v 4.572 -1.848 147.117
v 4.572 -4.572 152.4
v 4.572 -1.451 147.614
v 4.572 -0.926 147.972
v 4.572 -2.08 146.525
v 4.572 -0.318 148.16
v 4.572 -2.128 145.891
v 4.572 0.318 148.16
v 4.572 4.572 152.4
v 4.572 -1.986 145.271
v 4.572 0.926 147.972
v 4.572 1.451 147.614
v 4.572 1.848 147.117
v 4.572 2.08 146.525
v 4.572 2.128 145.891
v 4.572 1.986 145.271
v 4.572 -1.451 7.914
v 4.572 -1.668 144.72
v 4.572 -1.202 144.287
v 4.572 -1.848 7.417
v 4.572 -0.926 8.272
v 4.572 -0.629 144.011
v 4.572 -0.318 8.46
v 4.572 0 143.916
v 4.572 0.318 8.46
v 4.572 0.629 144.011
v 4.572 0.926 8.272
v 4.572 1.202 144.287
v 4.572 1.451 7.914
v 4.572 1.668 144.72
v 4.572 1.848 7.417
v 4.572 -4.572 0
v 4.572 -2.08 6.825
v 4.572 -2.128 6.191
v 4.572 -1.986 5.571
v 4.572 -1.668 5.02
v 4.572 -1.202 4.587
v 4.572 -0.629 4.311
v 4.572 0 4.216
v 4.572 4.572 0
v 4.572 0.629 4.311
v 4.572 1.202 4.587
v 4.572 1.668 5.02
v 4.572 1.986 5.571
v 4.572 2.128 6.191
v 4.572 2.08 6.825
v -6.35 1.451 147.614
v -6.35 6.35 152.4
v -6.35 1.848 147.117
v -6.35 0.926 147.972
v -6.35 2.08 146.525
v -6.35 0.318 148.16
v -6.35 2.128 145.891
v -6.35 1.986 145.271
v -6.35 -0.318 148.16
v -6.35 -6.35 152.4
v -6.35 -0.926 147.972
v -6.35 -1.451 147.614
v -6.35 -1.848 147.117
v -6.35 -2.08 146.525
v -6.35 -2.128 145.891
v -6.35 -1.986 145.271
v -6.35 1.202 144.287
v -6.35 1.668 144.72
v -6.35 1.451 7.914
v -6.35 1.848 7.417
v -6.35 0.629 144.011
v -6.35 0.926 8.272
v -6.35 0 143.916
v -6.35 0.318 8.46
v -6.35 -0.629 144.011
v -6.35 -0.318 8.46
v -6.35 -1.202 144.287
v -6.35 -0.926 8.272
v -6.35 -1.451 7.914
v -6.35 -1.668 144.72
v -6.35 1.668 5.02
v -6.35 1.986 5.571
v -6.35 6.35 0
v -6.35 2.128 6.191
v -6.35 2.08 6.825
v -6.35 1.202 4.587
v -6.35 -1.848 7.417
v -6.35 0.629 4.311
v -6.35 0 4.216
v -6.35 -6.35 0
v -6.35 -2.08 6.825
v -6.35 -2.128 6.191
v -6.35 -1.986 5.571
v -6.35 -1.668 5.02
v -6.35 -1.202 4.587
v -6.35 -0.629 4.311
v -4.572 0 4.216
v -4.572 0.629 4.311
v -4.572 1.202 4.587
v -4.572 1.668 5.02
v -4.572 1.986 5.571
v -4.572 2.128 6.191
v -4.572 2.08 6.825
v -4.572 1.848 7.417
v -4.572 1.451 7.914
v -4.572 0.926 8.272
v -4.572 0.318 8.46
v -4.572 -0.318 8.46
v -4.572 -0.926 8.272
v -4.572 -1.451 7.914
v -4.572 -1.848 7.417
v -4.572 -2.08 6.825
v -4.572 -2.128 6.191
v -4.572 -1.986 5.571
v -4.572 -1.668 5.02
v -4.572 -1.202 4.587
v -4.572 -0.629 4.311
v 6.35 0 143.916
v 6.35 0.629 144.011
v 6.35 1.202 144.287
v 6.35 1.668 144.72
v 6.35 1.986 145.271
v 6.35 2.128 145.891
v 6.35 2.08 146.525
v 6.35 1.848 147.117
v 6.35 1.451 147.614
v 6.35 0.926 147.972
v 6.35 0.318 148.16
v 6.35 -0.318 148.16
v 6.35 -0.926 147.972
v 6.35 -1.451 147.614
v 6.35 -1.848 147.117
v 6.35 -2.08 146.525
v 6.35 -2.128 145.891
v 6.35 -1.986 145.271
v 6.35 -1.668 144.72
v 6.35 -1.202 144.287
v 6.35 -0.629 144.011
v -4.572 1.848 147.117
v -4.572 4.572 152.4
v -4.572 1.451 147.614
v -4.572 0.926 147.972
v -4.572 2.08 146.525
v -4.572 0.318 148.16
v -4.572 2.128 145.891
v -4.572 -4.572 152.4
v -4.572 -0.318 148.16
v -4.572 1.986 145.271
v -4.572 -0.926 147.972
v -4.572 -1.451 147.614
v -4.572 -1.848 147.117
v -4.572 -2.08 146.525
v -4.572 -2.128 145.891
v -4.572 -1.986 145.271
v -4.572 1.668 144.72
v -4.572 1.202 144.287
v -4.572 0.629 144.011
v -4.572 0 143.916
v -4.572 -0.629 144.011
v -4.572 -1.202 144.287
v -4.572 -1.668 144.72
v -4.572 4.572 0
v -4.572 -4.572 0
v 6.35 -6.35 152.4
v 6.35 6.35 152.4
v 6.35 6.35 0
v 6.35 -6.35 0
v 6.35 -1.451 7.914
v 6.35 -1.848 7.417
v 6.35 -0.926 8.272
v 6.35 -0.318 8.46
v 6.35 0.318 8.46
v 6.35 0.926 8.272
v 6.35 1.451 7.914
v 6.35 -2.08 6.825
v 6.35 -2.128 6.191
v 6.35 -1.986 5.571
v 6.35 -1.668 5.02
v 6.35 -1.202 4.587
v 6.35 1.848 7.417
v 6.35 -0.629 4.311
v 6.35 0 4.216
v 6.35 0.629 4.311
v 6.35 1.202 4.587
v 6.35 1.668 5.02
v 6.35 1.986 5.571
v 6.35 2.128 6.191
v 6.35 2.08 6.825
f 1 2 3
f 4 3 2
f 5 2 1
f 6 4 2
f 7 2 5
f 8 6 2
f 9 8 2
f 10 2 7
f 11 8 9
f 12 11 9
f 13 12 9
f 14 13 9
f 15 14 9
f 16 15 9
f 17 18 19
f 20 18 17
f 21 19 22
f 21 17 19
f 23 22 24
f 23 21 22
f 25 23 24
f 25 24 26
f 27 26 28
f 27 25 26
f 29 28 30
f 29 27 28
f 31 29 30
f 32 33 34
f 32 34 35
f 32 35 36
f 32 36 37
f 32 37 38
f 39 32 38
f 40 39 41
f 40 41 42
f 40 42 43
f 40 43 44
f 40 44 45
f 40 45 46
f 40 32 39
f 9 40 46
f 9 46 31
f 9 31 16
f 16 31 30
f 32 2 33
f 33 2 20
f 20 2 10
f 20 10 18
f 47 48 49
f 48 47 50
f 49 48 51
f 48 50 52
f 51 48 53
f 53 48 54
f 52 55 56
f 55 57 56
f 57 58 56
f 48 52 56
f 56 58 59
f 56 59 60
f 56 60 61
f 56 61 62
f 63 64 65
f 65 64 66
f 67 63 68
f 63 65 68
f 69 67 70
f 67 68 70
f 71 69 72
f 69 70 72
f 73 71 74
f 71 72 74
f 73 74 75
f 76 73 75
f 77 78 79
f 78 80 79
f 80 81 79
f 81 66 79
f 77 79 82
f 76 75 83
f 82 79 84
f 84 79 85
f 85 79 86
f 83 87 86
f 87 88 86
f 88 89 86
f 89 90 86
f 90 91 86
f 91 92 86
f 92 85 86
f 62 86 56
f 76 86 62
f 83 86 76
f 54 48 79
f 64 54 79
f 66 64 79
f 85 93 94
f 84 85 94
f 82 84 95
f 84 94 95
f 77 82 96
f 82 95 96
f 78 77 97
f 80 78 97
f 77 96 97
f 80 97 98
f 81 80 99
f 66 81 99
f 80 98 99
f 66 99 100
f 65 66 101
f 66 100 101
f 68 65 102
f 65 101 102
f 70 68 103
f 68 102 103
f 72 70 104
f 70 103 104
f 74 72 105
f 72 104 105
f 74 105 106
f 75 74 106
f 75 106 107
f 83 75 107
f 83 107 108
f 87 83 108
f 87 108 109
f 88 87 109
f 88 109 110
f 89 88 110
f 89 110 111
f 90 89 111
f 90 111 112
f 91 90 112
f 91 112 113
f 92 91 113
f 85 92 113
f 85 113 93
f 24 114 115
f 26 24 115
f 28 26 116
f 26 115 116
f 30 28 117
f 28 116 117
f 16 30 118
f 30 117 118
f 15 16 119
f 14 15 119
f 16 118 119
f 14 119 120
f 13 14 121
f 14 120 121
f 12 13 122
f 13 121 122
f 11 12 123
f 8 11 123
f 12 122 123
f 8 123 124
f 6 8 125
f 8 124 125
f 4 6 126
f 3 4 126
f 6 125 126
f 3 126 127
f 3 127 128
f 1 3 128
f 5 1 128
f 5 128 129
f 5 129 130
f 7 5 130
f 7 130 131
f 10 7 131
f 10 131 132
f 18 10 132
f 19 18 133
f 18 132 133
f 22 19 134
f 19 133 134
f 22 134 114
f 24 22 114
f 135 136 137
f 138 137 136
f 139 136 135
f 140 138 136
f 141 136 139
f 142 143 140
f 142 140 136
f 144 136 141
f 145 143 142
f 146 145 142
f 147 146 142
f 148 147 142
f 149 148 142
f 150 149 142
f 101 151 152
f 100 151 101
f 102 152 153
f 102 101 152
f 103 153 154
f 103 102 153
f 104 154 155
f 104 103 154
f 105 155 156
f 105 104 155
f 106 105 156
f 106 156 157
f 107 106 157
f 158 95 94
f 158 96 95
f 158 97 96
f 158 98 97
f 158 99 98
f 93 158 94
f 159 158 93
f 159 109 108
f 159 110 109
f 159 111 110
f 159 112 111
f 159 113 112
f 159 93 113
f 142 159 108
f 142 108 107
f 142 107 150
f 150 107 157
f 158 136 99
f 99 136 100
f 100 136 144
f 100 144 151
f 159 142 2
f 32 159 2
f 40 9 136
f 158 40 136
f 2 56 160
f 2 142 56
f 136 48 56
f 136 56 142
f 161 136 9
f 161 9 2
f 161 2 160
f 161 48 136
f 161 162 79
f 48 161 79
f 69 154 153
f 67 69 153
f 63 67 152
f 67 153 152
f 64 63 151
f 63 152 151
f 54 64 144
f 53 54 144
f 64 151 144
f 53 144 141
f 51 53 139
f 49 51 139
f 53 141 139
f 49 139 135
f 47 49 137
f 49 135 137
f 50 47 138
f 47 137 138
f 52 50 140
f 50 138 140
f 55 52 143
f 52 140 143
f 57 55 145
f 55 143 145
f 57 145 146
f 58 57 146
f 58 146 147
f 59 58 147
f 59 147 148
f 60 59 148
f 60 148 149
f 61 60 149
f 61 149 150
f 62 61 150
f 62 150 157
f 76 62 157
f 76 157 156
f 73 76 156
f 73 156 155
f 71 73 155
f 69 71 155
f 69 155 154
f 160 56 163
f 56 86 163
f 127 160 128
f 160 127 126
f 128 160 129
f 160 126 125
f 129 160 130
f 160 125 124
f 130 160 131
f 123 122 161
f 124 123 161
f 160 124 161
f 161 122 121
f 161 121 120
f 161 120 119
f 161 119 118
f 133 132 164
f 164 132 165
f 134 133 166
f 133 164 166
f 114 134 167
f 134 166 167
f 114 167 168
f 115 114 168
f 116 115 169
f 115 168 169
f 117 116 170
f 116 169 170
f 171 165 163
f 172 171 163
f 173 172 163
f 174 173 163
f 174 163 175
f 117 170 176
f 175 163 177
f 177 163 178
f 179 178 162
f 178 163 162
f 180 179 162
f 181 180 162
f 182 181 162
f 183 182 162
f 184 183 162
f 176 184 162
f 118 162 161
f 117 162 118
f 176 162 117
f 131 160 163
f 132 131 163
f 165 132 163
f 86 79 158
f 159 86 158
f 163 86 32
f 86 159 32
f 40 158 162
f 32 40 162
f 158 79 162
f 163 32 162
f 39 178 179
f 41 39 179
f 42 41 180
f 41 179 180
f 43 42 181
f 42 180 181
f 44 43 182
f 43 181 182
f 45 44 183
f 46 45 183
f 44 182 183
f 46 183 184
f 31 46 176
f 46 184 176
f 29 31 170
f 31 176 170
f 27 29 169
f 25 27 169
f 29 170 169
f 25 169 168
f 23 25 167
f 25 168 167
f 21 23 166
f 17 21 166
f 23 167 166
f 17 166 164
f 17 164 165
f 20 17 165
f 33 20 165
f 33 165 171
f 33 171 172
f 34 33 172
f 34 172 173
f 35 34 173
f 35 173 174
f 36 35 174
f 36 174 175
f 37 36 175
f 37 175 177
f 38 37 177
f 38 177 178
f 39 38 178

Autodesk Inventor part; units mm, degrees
ref_plane "YZ Plane" through (0, 0, 0) normal (1, 0, 0) x (0, 1, 0)
ref_plane "XZ Plane" through (0, 0, 0) normal (0, 1, 0) x (-1, 0, 0)
ref_plane "XY Plane" through (0, 0, 0) normal (0, 0, 1) x (1, 0, 0)
sketch "Sketch1" plane through (0, 0, 0) normal (0, 0, 1) x (1, 0, 0)
  line L0 (-6.35, -6.35) -> (6.35, -6.35)
  line L1 (6.35, -6.35) -> (6.35, 6.35)
  line L2 (6.35, 6.35) -> (-6.35, 6.35)
  line L3 (-6.35, 6.35) -> (-6.35, -6.35)
  line L4 (-6.35, -6.35) -> (6.35, 6.35) construction
  line L5 (6.35, -6.35) -> (-6.35, 6.35) construction
  line L6 (4.572, 4.572) -> (-4.572, 4.572)
  line L7 (-4.572, 4.572) -> (-4.572, -4.572)
  line L8 (-4.572, -4.572) -> (4.572, -4.572)
  line L9 (4.572, -4.572) -> (4.572, 4.572)
  line L10 (4.572, 4.572) -> (-4.572, -4.572) construction
  line L11 (-4.572, 4.572) -> (4.572, -4.572) construction
  point P0 (0, 0)
  dimension "d0" = 12.7
  dimension "d1" = 12.7
  dimension "d2" = 10.922
  dimension "d3" = 10.922
extrude "Extrusion1" add sketch "Sketch1" along normal blind 152.4
sketch "Sketch2" plane through (6.35, -6.35, 0) normal (1, 0, 0) x (0, 0, -1)
  line L0 (0, 0) -> (0, 12.7) projected
  line L1 (-152.4, 0) -> (-152.4, 12.7) projected
  circle A0 centre (-146.05, 6.35) radius 2.1336
  circle A1 centre (-6.35, 6.35) radius 2.1336
  point P0 (0, 6.35)
  dimension "d6" = 4.2672
  dimension "d7" = 6.35
  dimension "d8" = 4.2672
  dimension "d9" = 6.35
extrude "Extrusion2" cut sketch "Sketch2" against normal blind 12.7
properties part number "ShortBox" material "Aluminum 6061"
